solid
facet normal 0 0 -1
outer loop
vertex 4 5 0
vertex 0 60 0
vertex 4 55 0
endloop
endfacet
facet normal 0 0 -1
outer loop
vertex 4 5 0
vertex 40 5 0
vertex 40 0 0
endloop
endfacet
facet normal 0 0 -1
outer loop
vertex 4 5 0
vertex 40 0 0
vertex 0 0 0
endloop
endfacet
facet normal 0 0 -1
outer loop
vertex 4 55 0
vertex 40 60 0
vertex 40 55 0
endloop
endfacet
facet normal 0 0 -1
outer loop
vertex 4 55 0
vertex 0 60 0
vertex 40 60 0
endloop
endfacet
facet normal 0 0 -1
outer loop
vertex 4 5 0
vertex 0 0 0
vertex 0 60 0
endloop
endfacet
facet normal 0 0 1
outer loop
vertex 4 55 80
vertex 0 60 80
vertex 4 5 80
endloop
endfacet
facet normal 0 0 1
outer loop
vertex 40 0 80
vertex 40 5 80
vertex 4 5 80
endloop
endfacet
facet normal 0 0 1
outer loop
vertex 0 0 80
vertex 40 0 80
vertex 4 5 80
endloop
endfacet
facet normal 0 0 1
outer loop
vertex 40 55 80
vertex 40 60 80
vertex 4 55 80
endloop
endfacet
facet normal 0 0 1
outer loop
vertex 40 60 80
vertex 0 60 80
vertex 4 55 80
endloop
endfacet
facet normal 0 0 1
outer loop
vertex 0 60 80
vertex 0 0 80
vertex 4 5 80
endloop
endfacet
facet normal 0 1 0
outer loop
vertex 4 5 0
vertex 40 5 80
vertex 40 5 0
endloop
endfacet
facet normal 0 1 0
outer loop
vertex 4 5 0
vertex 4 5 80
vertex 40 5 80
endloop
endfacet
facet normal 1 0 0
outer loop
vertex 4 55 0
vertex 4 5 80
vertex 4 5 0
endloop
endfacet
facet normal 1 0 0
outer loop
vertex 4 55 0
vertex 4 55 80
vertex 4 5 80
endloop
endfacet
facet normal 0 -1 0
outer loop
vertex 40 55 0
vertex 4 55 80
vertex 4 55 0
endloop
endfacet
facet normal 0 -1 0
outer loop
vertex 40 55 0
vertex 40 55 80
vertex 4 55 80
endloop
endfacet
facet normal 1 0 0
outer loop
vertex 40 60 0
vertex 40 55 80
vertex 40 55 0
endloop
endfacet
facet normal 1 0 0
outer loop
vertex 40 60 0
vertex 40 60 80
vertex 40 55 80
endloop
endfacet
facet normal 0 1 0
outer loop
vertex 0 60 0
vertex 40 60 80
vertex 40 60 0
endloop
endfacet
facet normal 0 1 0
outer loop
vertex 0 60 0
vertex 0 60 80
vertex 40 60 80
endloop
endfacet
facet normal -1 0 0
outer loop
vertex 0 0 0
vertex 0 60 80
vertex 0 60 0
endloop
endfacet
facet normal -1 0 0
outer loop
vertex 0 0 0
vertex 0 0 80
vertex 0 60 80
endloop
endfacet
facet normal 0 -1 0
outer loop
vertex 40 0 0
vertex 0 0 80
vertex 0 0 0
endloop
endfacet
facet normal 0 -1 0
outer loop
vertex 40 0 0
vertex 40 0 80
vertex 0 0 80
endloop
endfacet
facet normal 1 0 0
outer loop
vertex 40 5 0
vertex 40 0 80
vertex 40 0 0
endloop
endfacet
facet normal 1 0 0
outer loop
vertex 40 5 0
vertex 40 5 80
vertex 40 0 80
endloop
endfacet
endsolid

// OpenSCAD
$fn = 32;

// ----------------------------------------------------------------------
// Structural section: channel 40 x 60 mm
// ----------------------------------------------------------------------

// --- parameters (mm) ---
sec_w = 40;               // channel width, X
sec_h = 60;               // channel height, Y
flange_t = 5;             // flange thickness
web_t = 4;                // web thickness
plate_t = 80;             // cut length, Z (extrusion height)

profile = [[0, 0], [40, 0], [40, 5], [4, 5], [4, 55], [40, 55], [40, 60], [0, 60]];  // primary outline, 8 points, counter clockwise

// --- the one profile operation ---
linear_extrude(height = plate_t) polygon(points = profile);
